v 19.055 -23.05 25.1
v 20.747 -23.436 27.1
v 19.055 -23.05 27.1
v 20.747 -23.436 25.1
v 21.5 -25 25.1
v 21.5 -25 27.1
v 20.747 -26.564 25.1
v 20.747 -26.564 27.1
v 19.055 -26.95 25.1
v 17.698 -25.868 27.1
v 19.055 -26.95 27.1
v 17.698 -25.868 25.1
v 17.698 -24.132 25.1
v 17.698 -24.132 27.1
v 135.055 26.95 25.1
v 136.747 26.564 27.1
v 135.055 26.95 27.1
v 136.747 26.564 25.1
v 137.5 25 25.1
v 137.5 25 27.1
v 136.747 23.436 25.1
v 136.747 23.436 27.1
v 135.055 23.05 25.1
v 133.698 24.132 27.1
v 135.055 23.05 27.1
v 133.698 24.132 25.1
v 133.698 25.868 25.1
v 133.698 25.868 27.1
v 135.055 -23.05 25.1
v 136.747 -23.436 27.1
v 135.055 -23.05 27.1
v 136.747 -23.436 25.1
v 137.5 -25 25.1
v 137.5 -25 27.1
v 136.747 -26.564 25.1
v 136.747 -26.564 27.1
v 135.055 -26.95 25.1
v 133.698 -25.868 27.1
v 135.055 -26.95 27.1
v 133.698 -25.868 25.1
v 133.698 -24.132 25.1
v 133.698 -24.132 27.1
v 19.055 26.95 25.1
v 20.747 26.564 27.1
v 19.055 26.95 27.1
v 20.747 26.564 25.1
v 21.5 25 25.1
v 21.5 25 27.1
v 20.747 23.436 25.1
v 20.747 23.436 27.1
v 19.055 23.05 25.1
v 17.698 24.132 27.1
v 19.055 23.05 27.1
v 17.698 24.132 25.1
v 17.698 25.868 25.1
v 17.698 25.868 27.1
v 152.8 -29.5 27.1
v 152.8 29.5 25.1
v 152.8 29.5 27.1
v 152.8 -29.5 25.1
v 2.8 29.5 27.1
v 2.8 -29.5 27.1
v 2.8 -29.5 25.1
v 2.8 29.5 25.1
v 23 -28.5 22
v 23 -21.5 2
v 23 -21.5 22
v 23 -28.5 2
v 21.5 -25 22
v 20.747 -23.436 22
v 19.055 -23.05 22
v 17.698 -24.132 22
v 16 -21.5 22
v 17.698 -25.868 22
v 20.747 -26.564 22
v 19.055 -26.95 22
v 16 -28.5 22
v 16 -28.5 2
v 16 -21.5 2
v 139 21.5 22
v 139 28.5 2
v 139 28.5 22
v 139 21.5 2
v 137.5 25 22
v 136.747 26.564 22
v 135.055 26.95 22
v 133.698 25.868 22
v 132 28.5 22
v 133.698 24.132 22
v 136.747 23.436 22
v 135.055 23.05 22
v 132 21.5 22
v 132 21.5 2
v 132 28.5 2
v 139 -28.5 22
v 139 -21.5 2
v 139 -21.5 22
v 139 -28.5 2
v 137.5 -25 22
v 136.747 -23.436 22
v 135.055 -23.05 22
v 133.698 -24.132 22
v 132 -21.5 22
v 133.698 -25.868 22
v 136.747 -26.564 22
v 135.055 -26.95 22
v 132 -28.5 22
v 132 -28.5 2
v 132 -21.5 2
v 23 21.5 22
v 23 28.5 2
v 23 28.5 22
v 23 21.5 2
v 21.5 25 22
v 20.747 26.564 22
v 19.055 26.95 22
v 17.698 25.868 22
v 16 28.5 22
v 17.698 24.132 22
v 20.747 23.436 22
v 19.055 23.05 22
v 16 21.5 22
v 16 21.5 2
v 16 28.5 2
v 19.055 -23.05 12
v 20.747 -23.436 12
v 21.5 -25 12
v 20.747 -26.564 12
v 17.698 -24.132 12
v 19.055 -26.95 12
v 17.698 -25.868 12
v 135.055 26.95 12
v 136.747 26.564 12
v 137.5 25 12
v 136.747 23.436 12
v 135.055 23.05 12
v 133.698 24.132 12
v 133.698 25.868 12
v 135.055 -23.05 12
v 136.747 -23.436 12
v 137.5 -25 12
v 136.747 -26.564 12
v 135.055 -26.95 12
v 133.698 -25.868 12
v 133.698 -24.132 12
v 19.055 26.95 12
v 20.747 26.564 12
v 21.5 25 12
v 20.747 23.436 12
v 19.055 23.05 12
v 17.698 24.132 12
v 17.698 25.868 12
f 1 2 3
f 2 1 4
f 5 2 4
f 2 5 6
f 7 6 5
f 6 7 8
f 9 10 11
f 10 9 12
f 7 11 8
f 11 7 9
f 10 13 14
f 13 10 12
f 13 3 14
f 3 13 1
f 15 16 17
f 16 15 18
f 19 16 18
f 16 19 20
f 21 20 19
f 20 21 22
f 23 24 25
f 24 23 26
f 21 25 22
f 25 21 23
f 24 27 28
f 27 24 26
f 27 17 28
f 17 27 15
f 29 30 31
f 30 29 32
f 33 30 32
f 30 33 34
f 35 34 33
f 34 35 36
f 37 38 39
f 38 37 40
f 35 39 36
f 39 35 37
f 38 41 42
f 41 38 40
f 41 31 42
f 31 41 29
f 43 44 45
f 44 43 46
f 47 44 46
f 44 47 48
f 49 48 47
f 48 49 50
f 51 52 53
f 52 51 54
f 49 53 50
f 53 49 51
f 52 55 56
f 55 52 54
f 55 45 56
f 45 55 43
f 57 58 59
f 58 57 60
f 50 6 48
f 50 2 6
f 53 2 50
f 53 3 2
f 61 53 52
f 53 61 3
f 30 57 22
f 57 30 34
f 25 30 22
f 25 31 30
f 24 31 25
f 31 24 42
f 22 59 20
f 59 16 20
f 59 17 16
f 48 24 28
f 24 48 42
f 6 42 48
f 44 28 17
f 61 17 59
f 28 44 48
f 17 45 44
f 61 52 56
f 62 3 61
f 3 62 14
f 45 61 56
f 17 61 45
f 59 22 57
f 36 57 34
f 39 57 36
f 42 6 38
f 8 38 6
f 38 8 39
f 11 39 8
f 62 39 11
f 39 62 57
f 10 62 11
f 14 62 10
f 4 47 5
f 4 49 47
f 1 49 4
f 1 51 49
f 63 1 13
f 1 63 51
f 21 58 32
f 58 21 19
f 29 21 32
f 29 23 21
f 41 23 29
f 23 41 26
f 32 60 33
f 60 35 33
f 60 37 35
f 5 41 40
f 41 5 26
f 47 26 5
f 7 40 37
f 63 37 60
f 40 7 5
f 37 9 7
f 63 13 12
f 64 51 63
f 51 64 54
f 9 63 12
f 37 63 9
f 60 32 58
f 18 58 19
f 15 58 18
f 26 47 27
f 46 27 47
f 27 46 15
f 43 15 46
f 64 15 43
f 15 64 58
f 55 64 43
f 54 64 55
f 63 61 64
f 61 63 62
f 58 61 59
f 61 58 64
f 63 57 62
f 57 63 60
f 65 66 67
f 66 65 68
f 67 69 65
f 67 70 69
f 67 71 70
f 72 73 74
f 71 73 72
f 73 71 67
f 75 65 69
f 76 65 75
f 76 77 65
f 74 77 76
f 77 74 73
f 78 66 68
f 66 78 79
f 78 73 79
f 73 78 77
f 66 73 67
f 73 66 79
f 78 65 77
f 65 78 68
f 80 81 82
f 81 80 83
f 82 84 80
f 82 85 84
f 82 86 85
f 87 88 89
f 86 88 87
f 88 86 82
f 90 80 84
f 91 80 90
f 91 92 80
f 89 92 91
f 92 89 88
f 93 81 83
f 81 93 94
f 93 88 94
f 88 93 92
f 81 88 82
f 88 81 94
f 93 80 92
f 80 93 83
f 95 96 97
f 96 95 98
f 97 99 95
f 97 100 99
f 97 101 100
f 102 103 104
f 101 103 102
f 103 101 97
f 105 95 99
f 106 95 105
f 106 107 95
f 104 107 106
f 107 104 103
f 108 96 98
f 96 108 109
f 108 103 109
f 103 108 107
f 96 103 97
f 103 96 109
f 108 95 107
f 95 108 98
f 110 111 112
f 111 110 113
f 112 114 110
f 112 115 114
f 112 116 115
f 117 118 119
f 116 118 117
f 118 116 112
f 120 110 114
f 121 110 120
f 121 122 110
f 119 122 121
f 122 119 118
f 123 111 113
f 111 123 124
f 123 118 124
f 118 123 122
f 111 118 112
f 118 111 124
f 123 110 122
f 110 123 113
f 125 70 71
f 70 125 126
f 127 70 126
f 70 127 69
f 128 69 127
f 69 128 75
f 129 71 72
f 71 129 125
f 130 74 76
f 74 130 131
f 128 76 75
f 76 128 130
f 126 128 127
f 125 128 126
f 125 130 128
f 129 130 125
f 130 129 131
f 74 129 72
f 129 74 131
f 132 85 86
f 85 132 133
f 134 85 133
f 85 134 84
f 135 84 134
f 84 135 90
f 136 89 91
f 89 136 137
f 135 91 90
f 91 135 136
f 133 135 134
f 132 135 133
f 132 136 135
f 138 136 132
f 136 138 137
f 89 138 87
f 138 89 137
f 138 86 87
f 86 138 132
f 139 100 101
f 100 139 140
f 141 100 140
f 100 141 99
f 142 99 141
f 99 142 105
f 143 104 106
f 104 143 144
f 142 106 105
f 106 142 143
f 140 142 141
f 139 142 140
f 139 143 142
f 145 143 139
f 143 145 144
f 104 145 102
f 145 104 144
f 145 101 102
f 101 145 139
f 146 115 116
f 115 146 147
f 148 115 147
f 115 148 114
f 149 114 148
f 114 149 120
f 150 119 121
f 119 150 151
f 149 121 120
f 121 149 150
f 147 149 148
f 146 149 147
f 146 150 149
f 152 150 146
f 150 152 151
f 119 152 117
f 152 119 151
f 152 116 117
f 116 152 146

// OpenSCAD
module cover(){
difference(){
translate([5-2.2,-58/2-0.5,25.1])
cube([150,59,2]);

union(){

translate([7.5+12,-58/2+4,20])
cylinder(r=2,h=15);
translate([7.5-12+140,-58/2-4+58,20])
cylinder(r=2,h=15);
translate([7.5-12+140,-58/2+4,20])
cylinder(r=2,h=15);
translate([7.5+12,-58/2-4+58,20])
cylinder(r=2,h=15);

}
}

}

module cover_holes(){
translate([7.5+12,-58/2+4,12])
cylinder(r=2,h=15);
translate([7.5-12+140,-58/2-4+58,12])
cylinder(r=2,h=15);
translate([7.5-12+140,-58/2+4,12])
cylinder(r=2,h=15);
translate([7.5+12,-58/2-4+58,12])
cylinder(r=2,h=15);
}

module cover_sockets(){
difference(){
union(){
translate([7.5+12,-58/2+4,12])
cube([7,7,20],center=true);
translate([7.5-12+140,-58/2-4+58,12])
cube([7,7,20],center=true);
translate([7.5-12+140,-58/2+4,12])
cube([7,7,20],center=true);
translate([7.5+12,-58/2-4+58,12])
cube([7,7,20],center=true);
}
cover_holes();
}
}



cover();
//cover_holes();
cover_sockets();
